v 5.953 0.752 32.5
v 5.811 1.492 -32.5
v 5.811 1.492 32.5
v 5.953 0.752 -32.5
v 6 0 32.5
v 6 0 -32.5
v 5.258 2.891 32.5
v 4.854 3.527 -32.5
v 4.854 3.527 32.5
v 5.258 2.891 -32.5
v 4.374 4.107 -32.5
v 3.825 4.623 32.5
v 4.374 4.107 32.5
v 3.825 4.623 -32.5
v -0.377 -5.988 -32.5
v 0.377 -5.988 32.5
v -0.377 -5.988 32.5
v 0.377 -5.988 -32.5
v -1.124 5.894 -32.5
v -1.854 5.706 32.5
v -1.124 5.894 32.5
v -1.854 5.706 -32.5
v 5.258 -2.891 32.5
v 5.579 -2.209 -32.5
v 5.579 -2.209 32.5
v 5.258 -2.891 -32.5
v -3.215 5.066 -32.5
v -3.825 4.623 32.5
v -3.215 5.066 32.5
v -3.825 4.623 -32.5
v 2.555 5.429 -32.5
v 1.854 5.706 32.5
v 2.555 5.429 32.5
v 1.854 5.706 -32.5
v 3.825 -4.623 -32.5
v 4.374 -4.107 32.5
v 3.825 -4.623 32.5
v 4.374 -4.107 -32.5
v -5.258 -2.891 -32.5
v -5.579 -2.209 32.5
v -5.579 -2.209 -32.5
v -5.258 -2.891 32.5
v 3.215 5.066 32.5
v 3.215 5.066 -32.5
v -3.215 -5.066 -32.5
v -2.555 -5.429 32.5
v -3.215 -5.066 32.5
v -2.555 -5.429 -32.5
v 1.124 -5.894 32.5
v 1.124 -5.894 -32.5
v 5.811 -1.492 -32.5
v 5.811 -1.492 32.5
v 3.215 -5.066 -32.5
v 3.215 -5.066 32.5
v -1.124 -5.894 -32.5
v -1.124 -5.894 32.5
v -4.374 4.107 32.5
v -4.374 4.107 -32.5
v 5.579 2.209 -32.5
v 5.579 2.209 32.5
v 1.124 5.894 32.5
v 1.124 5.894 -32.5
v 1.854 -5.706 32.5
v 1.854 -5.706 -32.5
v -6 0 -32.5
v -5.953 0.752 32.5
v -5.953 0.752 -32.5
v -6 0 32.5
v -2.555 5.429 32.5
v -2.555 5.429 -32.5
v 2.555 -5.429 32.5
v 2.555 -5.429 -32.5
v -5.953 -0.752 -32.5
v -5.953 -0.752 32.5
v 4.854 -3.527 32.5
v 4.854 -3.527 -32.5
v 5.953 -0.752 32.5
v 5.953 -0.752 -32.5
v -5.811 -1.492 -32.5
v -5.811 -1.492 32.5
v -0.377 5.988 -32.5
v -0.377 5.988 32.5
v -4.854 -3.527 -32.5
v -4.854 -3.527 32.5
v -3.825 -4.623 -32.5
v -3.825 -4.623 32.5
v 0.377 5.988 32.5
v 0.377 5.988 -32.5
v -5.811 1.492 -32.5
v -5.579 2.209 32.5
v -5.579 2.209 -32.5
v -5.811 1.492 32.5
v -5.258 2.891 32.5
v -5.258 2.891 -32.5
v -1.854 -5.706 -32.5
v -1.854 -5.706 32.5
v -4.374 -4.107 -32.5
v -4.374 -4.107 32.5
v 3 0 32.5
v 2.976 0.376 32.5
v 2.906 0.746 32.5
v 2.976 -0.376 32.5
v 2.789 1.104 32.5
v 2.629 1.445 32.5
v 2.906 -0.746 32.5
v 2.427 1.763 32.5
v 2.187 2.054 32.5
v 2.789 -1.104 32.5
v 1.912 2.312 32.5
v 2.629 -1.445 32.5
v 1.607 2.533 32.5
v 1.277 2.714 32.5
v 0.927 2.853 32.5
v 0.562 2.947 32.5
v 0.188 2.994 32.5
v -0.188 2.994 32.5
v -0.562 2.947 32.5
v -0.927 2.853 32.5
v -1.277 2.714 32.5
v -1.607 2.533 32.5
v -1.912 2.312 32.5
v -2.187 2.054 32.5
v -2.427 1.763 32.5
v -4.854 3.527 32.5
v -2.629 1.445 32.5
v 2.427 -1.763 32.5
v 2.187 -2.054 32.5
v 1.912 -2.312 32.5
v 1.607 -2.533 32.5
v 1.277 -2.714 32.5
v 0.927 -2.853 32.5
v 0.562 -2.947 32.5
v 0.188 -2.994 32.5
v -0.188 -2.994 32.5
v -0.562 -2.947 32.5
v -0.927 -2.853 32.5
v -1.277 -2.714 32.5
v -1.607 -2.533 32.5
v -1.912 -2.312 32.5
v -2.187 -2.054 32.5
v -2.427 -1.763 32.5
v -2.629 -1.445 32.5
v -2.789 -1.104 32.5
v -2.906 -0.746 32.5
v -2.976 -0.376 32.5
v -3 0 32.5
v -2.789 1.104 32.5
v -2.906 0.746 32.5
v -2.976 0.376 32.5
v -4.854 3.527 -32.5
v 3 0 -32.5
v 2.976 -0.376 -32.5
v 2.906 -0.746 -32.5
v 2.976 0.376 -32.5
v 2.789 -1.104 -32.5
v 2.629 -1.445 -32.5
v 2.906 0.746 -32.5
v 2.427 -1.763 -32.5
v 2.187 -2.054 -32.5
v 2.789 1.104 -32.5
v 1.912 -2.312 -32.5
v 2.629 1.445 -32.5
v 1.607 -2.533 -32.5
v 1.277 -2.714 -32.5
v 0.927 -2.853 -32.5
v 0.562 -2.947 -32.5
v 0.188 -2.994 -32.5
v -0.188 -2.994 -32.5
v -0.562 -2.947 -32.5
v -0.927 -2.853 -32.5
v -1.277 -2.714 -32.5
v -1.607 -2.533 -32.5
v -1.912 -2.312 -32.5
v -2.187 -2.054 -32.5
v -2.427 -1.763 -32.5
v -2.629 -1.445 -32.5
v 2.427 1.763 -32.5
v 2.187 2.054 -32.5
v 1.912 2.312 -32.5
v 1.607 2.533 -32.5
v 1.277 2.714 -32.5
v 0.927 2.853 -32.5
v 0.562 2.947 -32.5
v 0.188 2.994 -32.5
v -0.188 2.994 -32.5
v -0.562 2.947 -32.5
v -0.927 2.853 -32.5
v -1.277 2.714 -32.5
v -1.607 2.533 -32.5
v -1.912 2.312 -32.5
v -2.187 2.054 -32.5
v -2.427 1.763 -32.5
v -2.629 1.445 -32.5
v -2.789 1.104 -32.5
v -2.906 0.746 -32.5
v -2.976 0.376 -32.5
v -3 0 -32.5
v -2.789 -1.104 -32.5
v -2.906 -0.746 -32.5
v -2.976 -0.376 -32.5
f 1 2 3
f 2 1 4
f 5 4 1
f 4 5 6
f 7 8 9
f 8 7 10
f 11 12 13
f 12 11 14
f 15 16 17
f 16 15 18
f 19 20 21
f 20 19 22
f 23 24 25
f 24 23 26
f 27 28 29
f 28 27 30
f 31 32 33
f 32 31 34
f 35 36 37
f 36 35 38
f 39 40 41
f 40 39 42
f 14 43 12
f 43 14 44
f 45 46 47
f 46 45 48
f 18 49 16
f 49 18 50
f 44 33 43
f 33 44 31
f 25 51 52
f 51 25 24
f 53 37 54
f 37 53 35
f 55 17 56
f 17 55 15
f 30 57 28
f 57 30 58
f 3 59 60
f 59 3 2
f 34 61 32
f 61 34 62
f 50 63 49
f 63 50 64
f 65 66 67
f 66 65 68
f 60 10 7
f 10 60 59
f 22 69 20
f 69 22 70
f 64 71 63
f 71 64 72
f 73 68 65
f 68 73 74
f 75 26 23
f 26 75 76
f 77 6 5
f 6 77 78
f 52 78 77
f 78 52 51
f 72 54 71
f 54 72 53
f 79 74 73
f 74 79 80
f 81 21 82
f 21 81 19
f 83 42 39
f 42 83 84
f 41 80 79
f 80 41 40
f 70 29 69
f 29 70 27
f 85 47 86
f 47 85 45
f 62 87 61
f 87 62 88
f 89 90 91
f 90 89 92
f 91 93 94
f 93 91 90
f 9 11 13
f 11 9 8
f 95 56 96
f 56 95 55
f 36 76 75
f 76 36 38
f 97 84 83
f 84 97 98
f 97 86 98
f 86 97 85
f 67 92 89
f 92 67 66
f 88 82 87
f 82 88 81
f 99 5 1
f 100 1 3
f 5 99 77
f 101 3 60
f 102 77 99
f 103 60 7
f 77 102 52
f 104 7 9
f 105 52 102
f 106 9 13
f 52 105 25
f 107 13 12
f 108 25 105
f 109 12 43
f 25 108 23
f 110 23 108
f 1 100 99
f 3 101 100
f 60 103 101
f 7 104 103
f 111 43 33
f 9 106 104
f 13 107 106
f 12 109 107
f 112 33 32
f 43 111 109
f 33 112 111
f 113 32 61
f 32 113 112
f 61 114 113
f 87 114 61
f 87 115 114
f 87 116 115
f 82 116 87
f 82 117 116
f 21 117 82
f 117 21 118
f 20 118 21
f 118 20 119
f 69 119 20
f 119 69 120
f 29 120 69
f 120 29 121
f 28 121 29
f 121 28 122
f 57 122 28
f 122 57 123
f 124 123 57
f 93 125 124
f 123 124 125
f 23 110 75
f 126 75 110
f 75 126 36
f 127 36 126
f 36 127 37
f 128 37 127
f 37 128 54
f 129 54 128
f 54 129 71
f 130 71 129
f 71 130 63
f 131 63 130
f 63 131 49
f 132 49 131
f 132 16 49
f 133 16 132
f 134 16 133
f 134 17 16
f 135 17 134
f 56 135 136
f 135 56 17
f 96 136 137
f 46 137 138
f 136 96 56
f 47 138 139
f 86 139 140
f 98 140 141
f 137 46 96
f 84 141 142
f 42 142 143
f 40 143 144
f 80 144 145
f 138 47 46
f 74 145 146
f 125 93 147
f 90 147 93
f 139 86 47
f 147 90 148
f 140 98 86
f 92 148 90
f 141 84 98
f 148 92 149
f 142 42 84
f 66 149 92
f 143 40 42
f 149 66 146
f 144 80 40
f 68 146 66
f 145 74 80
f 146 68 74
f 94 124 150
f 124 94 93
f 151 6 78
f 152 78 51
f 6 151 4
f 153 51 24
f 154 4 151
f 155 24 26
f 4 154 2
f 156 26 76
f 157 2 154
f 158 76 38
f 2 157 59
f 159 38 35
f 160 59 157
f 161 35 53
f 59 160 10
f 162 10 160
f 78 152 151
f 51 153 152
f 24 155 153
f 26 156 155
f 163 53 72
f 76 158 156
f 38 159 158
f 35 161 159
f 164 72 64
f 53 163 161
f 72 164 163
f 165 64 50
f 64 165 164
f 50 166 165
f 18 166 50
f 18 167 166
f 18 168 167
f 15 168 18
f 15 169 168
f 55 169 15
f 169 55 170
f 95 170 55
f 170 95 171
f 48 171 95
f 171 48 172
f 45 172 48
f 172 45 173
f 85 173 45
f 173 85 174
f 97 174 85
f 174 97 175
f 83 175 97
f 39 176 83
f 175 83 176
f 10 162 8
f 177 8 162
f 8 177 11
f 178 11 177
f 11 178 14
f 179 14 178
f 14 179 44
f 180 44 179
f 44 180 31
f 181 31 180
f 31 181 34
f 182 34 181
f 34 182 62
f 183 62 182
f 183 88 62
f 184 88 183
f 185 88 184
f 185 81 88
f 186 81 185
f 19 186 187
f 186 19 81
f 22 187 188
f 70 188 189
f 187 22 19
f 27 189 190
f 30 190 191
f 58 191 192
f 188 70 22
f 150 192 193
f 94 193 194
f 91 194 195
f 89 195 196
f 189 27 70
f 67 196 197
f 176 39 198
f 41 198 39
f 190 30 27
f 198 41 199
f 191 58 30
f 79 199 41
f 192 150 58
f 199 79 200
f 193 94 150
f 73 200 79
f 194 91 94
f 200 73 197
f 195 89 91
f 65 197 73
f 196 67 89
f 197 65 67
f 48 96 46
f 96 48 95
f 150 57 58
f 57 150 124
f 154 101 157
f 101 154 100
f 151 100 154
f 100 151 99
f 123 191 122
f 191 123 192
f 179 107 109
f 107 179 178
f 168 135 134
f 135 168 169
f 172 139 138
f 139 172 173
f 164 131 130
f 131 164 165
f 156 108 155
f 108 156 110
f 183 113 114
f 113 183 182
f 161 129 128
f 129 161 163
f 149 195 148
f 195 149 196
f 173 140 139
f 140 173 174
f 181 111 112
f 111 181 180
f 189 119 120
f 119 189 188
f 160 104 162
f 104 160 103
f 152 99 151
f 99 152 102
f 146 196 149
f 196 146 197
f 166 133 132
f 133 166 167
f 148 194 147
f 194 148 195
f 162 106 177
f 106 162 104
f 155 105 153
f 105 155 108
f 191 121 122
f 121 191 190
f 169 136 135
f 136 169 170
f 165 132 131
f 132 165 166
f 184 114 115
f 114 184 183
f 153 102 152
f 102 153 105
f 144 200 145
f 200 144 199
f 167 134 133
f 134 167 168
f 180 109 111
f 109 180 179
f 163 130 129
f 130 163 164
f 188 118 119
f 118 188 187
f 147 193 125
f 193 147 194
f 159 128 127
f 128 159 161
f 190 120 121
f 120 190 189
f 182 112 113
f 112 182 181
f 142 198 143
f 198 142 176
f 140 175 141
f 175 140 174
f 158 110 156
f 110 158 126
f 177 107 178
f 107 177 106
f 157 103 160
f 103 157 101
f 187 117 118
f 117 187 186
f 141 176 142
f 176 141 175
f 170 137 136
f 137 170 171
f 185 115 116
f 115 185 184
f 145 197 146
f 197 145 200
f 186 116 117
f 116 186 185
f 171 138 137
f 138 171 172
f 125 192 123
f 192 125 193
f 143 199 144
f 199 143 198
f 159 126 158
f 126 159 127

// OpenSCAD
$fn = 50;


difference() {
	union() {
		translate(v = [0, 0, -32.5000000000]) {
			cylinder(h = 65, r = 6.0000000000);
		}
	}
	union() {
		translate(v = [0, 0, -100.0000000000]) {
			cylinder(h = 200, r = 3.0000000000);
		}
	}
}
